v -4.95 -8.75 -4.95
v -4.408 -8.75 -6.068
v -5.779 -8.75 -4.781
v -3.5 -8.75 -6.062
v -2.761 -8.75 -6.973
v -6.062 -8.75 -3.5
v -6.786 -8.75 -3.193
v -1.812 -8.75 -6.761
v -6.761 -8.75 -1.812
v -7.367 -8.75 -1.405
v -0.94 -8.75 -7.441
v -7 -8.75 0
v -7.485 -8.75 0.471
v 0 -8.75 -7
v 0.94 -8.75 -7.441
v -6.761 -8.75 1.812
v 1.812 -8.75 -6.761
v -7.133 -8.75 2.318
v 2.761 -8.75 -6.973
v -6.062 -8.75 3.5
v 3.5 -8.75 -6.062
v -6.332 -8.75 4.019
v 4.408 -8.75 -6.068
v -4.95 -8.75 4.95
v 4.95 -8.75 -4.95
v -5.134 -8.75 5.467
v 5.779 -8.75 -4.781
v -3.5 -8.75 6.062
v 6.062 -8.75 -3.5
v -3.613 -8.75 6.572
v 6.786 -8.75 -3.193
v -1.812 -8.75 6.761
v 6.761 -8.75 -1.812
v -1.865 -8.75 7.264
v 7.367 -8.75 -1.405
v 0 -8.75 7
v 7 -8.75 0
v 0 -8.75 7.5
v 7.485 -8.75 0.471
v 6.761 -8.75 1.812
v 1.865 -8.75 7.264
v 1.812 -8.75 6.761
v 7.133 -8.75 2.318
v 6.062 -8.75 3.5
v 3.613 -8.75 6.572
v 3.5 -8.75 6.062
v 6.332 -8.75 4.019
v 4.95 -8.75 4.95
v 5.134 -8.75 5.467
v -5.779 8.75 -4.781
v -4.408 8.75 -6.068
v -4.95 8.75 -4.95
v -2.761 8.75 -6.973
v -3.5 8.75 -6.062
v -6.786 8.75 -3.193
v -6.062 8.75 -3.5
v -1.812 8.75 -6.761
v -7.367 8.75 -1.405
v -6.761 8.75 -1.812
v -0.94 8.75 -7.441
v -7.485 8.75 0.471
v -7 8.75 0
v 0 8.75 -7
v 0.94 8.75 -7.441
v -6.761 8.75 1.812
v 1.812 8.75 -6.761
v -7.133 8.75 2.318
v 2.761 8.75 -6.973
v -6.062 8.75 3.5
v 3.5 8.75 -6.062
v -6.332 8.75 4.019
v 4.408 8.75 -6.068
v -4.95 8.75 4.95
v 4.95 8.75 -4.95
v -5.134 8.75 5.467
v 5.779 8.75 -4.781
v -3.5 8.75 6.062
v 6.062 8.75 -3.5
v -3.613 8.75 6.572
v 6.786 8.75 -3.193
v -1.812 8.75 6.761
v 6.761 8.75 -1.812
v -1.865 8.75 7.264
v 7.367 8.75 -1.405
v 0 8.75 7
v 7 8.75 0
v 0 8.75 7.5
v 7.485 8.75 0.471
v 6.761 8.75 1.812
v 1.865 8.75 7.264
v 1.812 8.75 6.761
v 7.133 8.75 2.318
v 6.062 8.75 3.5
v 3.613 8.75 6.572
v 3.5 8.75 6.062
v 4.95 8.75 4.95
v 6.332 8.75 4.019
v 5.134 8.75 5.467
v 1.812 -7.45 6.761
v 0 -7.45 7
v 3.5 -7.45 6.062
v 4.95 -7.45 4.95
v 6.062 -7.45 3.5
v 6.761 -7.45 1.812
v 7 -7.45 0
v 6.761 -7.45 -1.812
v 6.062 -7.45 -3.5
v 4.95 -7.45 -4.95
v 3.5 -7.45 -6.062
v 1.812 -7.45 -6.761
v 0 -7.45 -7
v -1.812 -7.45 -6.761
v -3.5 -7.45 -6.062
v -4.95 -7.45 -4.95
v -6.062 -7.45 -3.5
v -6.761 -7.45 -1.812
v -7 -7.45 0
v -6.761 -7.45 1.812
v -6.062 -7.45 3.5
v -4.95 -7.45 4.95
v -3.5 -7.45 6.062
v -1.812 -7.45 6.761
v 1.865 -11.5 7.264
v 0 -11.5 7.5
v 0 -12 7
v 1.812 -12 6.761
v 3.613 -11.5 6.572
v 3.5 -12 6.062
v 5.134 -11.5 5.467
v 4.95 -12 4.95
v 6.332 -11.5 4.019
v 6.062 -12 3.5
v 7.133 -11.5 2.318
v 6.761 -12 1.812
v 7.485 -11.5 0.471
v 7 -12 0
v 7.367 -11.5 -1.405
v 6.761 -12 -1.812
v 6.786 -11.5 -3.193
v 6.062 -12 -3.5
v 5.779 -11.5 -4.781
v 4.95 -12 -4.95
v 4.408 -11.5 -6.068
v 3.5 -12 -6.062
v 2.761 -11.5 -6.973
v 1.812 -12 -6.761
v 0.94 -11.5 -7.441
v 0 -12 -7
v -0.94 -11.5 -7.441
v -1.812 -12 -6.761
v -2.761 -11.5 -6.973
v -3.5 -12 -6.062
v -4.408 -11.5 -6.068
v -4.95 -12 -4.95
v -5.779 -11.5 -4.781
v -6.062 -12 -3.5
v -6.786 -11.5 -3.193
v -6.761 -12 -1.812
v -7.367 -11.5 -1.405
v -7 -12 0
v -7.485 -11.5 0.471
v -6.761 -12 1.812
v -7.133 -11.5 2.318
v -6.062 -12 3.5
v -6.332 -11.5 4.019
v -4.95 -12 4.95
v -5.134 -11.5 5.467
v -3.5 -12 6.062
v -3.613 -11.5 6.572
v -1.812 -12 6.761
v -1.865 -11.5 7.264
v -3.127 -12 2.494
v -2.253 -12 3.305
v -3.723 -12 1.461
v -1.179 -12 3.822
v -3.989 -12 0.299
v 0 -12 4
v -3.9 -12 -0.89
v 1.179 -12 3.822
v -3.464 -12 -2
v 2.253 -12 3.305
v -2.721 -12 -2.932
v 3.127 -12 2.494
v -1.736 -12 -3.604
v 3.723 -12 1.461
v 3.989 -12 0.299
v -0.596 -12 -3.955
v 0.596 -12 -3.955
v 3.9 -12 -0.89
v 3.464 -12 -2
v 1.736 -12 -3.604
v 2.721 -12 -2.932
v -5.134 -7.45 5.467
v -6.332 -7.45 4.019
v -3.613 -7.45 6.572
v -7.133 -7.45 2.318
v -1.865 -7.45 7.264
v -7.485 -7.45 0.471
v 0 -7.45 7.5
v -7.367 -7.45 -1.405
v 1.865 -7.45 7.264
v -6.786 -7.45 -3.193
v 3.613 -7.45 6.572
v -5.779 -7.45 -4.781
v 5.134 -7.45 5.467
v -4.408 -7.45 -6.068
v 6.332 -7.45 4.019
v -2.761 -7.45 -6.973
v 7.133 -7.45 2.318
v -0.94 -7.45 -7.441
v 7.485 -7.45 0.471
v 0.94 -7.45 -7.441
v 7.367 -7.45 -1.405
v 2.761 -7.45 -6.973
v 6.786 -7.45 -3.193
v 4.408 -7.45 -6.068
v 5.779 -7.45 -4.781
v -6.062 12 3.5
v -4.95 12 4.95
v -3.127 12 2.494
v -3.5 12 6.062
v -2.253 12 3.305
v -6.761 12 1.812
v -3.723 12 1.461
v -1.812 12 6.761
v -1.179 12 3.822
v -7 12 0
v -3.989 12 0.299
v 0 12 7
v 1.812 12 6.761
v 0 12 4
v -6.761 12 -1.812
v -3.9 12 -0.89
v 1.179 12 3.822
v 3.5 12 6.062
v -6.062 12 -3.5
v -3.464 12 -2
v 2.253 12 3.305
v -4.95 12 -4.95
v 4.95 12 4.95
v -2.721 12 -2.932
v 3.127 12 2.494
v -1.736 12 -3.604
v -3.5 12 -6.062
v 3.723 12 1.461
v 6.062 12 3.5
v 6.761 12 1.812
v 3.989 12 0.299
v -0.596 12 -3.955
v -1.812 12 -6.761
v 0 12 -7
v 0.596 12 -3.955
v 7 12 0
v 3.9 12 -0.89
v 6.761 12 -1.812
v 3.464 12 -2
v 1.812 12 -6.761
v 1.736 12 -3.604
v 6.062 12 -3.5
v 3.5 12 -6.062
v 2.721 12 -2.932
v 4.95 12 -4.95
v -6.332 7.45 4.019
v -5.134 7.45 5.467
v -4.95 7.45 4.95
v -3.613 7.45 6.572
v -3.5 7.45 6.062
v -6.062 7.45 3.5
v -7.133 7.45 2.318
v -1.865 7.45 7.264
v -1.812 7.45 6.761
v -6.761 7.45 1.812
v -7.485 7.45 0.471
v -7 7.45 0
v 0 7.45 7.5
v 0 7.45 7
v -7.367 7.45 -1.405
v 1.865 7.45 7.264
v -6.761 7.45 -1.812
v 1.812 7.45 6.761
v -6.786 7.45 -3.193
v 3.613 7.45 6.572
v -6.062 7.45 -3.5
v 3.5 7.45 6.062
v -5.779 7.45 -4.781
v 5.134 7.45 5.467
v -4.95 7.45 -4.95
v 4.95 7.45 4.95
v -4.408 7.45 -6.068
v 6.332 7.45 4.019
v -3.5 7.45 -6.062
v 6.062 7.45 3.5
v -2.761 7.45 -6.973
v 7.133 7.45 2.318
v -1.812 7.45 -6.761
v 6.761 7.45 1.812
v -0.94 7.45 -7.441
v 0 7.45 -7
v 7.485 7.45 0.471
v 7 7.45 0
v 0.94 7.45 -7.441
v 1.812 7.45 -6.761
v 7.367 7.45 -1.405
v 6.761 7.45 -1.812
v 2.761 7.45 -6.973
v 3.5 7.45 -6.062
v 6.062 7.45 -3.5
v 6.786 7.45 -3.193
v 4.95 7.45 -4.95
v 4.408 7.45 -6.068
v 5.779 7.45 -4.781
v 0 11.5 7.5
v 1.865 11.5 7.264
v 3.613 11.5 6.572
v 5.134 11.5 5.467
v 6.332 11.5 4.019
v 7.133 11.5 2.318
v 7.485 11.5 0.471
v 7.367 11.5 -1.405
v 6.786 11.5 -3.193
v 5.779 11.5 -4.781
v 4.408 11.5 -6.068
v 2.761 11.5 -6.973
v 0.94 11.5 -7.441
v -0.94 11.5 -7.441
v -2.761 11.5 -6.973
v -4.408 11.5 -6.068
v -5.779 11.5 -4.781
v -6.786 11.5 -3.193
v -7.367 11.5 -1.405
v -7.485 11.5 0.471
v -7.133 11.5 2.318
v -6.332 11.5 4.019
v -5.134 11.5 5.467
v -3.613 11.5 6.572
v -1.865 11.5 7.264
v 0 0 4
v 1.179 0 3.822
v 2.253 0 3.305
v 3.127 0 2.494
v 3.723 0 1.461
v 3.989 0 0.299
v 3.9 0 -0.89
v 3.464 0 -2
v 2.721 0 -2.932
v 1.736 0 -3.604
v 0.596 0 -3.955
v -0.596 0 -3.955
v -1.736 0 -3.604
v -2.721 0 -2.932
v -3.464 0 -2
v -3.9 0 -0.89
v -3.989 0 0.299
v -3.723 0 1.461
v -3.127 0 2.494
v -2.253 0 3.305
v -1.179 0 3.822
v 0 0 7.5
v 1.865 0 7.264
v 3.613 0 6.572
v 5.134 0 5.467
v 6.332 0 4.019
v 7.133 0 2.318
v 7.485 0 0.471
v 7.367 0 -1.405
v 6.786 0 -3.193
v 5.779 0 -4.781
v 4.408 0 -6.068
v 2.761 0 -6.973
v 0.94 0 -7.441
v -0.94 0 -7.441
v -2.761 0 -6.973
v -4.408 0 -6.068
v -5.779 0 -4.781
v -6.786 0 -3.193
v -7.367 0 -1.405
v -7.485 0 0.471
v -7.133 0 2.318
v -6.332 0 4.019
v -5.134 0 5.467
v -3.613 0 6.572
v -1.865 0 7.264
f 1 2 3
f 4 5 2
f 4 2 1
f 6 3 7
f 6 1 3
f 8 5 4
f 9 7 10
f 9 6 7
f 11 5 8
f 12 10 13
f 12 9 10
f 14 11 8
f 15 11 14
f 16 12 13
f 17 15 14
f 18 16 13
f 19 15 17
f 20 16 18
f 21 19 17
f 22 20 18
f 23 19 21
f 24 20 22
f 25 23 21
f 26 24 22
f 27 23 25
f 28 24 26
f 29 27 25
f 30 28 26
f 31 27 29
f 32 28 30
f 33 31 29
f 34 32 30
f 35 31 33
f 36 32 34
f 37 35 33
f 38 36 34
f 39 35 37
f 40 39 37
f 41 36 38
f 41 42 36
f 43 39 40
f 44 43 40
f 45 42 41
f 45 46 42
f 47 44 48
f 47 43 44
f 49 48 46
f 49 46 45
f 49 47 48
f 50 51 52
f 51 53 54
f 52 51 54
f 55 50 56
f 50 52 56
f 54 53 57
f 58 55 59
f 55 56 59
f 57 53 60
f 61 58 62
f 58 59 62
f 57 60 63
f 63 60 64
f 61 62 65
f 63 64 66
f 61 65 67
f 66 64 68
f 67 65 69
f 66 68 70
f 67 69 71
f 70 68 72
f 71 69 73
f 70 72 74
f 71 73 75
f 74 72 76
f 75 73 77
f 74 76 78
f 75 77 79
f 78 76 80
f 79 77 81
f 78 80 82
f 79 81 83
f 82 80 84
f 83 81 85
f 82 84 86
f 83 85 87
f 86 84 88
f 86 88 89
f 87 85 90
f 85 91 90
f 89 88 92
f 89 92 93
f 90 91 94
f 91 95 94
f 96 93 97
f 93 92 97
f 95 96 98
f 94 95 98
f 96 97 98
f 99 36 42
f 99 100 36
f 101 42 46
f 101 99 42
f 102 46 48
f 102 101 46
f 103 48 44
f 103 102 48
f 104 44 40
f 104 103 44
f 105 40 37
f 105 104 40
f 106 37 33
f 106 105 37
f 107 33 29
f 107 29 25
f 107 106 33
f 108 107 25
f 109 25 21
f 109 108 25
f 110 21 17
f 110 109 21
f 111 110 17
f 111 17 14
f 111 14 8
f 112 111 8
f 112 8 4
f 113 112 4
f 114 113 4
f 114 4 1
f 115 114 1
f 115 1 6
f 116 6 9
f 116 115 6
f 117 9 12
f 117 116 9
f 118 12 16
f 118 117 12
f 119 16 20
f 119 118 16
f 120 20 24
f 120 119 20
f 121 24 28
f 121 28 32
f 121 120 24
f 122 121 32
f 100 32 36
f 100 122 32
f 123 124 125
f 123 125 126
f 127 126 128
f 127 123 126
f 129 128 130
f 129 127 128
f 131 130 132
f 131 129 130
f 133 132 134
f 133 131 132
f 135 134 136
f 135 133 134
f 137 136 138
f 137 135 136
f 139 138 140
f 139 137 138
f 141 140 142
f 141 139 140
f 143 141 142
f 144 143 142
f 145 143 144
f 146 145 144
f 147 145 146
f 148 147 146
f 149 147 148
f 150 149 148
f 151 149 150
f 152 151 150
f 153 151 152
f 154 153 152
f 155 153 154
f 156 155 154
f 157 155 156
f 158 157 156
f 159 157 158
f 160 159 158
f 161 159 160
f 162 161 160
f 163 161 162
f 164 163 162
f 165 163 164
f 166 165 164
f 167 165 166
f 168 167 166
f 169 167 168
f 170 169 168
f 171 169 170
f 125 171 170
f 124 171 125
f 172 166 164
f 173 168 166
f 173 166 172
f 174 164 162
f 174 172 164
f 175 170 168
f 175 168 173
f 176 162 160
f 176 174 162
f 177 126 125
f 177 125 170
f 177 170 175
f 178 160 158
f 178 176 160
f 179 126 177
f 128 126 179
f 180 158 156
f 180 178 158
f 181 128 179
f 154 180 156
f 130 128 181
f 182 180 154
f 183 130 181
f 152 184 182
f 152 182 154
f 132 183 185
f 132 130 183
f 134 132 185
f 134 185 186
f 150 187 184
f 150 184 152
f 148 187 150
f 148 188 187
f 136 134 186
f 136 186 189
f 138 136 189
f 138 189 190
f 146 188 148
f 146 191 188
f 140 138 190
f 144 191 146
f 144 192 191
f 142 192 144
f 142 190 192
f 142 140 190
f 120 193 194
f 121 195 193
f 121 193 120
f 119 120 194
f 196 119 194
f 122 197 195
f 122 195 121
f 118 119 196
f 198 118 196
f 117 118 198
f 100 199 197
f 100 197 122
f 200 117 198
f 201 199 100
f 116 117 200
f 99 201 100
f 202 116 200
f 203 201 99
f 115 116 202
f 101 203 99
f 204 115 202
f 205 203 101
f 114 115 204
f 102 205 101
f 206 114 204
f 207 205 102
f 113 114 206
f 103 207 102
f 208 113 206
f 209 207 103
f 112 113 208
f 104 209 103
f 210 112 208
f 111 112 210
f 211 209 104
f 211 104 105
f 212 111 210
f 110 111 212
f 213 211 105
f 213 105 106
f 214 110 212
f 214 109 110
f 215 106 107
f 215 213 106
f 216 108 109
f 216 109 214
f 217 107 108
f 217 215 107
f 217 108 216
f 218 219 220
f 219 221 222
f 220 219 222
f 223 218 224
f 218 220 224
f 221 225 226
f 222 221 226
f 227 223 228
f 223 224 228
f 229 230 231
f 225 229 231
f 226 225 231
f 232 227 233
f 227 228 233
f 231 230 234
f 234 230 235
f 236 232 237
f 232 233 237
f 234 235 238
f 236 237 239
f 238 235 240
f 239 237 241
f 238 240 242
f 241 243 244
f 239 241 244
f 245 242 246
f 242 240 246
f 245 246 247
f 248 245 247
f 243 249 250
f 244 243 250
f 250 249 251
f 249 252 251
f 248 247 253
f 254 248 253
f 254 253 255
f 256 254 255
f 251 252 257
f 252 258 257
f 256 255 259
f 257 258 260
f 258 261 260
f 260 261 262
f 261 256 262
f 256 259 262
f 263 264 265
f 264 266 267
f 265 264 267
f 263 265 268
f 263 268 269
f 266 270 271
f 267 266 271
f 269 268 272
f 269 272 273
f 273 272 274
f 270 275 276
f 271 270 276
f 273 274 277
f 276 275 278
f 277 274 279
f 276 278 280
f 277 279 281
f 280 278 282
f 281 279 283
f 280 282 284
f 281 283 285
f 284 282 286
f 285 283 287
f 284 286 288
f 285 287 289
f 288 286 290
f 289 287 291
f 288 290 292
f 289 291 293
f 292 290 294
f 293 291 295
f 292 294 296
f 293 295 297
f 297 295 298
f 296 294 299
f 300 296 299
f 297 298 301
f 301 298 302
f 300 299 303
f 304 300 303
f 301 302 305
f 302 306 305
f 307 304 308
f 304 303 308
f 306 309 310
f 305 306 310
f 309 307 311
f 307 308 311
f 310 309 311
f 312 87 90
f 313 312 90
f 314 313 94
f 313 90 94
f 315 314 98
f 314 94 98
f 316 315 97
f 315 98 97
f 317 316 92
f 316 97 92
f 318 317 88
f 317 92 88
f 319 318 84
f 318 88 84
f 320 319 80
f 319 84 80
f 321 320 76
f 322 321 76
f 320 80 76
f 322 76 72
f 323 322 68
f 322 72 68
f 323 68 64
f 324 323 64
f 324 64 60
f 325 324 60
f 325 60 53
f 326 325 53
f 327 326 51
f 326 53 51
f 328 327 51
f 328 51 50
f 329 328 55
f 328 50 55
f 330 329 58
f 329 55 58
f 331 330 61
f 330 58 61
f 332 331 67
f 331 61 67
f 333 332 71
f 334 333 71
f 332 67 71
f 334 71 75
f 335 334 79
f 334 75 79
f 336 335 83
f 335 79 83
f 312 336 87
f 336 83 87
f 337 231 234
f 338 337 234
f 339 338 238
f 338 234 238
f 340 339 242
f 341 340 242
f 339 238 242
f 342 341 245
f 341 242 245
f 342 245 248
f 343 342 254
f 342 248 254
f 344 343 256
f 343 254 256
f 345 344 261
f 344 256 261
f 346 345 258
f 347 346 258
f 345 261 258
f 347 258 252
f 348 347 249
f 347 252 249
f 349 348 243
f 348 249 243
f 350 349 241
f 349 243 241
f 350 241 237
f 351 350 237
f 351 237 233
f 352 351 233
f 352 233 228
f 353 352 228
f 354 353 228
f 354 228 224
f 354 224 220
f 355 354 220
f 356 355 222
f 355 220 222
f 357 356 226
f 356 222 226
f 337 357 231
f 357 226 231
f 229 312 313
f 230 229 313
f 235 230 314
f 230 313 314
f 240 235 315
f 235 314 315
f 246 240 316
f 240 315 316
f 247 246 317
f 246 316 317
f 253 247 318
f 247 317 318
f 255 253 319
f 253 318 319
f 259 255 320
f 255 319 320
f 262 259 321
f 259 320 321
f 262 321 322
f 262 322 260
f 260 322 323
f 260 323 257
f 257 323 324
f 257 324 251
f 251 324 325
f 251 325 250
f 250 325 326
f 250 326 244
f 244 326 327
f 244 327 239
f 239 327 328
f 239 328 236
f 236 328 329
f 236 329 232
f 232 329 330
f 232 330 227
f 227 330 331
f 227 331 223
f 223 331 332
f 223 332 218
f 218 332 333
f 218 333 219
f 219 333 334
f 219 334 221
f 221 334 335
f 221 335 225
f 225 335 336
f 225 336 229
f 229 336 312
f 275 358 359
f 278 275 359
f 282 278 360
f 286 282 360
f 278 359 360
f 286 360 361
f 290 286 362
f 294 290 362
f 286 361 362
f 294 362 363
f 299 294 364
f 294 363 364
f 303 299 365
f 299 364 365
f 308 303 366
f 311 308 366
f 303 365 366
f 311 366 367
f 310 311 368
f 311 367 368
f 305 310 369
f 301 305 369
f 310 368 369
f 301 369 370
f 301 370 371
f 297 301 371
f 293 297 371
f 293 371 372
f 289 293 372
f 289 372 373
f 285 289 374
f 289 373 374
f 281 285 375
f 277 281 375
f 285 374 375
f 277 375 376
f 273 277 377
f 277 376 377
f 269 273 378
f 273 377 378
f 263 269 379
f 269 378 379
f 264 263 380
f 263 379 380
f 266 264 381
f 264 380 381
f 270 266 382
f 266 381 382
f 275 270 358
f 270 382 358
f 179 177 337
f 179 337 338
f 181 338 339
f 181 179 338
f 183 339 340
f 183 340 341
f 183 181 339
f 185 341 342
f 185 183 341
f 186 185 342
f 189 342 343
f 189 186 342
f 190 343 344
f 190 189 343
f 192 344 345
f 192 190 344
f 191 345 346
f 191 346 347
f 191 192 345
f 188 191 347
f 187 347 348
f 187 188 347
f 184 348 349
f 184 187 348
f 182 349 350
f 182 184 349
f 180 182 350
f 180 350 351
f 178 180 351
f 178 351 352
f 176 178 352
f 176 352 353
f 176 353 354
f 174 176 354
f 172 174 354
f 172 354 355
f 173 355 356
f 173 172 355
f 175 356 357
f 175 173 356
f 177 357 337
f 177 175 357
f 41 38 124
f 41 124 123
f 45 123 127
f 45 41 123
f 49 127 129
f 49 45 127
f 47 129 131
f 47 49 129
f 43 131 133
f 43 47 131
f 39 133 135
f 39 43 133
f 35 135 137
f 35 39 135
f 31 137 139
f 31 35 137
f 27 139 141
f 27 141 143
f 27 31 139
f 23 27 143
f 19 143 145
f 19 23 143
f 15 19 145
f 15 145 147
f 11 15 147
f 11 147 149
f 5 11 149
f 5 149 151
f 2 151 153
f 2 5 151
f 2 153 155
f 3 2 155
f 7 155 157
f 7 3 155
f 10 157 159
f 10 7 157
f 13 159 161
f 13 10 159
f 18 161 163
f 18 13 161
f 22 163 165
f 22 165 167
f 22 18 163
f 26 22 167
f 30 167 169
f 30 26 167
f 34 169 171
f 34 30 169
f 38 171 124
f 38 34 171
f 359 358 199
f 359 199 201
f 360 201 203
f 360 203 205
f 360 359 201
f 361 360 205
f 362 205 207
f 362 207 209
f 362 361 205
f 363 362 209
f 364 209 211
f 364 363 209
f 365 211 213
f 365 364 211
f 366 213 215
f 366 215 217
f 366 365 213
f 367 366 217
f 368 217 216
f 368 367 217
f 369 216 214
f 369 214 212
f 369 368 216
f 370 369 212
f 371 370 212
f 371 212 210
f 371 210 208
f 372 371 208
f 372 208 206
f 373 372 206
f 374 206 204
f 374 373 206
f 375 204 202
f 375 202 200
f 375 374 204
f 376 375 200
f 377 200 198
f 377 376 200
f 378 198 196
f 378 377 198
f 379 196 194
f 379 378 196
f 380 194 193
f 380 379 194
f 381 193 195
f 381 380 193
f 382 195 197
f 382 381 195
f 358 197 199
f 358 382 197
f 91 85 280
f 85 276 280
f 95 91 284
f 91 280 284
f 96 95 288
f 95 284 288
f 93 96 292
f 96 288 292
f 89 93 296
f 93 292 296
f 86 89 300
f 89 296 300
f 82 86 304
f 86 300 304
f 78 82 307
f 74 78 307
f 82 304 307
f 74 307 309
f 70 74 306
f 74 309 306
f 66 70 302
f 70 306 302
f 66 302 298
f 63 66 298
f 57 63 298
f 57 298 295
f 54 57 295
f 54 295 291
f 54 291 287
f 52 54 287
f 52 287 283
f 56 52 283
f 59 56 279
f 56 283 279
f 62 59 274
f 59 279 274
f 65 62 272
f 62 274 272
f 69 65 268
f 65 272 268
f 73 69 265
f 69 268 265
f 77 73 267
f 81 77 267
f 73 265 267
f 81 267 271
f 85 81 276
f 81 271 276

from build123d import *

# Parameters (mm, degrees)
F2_SIZE = 0.5


with BuildPart() as f1:
    # F0 (on Right) → F1 (revolve)
    with BuildSketch(Plane.YZ):
        Polygon((0, 7.5), (0, 4), (12, 4), (12, 7.5), (8.75, 7.5), (8.75, 7), (7.45, 7), (7.45, 7.5), align=None)
    revolve(axis=Axis((0, 6.756852, 0), (0, 1, 0)))

    # F2
    f2_edges = [f1.edges().sort_by_distance(p)[0] for p in [
        (0, 12, -7.5),
    ]]
    chamfer(f2_edges, length=F2_SIZE)

    # F3: F1 across face


with BuildPart() as f1_1:
    add(f1.part)
    add(f1.part.mirror(Plane.XZ))


solid = f1_1.part
